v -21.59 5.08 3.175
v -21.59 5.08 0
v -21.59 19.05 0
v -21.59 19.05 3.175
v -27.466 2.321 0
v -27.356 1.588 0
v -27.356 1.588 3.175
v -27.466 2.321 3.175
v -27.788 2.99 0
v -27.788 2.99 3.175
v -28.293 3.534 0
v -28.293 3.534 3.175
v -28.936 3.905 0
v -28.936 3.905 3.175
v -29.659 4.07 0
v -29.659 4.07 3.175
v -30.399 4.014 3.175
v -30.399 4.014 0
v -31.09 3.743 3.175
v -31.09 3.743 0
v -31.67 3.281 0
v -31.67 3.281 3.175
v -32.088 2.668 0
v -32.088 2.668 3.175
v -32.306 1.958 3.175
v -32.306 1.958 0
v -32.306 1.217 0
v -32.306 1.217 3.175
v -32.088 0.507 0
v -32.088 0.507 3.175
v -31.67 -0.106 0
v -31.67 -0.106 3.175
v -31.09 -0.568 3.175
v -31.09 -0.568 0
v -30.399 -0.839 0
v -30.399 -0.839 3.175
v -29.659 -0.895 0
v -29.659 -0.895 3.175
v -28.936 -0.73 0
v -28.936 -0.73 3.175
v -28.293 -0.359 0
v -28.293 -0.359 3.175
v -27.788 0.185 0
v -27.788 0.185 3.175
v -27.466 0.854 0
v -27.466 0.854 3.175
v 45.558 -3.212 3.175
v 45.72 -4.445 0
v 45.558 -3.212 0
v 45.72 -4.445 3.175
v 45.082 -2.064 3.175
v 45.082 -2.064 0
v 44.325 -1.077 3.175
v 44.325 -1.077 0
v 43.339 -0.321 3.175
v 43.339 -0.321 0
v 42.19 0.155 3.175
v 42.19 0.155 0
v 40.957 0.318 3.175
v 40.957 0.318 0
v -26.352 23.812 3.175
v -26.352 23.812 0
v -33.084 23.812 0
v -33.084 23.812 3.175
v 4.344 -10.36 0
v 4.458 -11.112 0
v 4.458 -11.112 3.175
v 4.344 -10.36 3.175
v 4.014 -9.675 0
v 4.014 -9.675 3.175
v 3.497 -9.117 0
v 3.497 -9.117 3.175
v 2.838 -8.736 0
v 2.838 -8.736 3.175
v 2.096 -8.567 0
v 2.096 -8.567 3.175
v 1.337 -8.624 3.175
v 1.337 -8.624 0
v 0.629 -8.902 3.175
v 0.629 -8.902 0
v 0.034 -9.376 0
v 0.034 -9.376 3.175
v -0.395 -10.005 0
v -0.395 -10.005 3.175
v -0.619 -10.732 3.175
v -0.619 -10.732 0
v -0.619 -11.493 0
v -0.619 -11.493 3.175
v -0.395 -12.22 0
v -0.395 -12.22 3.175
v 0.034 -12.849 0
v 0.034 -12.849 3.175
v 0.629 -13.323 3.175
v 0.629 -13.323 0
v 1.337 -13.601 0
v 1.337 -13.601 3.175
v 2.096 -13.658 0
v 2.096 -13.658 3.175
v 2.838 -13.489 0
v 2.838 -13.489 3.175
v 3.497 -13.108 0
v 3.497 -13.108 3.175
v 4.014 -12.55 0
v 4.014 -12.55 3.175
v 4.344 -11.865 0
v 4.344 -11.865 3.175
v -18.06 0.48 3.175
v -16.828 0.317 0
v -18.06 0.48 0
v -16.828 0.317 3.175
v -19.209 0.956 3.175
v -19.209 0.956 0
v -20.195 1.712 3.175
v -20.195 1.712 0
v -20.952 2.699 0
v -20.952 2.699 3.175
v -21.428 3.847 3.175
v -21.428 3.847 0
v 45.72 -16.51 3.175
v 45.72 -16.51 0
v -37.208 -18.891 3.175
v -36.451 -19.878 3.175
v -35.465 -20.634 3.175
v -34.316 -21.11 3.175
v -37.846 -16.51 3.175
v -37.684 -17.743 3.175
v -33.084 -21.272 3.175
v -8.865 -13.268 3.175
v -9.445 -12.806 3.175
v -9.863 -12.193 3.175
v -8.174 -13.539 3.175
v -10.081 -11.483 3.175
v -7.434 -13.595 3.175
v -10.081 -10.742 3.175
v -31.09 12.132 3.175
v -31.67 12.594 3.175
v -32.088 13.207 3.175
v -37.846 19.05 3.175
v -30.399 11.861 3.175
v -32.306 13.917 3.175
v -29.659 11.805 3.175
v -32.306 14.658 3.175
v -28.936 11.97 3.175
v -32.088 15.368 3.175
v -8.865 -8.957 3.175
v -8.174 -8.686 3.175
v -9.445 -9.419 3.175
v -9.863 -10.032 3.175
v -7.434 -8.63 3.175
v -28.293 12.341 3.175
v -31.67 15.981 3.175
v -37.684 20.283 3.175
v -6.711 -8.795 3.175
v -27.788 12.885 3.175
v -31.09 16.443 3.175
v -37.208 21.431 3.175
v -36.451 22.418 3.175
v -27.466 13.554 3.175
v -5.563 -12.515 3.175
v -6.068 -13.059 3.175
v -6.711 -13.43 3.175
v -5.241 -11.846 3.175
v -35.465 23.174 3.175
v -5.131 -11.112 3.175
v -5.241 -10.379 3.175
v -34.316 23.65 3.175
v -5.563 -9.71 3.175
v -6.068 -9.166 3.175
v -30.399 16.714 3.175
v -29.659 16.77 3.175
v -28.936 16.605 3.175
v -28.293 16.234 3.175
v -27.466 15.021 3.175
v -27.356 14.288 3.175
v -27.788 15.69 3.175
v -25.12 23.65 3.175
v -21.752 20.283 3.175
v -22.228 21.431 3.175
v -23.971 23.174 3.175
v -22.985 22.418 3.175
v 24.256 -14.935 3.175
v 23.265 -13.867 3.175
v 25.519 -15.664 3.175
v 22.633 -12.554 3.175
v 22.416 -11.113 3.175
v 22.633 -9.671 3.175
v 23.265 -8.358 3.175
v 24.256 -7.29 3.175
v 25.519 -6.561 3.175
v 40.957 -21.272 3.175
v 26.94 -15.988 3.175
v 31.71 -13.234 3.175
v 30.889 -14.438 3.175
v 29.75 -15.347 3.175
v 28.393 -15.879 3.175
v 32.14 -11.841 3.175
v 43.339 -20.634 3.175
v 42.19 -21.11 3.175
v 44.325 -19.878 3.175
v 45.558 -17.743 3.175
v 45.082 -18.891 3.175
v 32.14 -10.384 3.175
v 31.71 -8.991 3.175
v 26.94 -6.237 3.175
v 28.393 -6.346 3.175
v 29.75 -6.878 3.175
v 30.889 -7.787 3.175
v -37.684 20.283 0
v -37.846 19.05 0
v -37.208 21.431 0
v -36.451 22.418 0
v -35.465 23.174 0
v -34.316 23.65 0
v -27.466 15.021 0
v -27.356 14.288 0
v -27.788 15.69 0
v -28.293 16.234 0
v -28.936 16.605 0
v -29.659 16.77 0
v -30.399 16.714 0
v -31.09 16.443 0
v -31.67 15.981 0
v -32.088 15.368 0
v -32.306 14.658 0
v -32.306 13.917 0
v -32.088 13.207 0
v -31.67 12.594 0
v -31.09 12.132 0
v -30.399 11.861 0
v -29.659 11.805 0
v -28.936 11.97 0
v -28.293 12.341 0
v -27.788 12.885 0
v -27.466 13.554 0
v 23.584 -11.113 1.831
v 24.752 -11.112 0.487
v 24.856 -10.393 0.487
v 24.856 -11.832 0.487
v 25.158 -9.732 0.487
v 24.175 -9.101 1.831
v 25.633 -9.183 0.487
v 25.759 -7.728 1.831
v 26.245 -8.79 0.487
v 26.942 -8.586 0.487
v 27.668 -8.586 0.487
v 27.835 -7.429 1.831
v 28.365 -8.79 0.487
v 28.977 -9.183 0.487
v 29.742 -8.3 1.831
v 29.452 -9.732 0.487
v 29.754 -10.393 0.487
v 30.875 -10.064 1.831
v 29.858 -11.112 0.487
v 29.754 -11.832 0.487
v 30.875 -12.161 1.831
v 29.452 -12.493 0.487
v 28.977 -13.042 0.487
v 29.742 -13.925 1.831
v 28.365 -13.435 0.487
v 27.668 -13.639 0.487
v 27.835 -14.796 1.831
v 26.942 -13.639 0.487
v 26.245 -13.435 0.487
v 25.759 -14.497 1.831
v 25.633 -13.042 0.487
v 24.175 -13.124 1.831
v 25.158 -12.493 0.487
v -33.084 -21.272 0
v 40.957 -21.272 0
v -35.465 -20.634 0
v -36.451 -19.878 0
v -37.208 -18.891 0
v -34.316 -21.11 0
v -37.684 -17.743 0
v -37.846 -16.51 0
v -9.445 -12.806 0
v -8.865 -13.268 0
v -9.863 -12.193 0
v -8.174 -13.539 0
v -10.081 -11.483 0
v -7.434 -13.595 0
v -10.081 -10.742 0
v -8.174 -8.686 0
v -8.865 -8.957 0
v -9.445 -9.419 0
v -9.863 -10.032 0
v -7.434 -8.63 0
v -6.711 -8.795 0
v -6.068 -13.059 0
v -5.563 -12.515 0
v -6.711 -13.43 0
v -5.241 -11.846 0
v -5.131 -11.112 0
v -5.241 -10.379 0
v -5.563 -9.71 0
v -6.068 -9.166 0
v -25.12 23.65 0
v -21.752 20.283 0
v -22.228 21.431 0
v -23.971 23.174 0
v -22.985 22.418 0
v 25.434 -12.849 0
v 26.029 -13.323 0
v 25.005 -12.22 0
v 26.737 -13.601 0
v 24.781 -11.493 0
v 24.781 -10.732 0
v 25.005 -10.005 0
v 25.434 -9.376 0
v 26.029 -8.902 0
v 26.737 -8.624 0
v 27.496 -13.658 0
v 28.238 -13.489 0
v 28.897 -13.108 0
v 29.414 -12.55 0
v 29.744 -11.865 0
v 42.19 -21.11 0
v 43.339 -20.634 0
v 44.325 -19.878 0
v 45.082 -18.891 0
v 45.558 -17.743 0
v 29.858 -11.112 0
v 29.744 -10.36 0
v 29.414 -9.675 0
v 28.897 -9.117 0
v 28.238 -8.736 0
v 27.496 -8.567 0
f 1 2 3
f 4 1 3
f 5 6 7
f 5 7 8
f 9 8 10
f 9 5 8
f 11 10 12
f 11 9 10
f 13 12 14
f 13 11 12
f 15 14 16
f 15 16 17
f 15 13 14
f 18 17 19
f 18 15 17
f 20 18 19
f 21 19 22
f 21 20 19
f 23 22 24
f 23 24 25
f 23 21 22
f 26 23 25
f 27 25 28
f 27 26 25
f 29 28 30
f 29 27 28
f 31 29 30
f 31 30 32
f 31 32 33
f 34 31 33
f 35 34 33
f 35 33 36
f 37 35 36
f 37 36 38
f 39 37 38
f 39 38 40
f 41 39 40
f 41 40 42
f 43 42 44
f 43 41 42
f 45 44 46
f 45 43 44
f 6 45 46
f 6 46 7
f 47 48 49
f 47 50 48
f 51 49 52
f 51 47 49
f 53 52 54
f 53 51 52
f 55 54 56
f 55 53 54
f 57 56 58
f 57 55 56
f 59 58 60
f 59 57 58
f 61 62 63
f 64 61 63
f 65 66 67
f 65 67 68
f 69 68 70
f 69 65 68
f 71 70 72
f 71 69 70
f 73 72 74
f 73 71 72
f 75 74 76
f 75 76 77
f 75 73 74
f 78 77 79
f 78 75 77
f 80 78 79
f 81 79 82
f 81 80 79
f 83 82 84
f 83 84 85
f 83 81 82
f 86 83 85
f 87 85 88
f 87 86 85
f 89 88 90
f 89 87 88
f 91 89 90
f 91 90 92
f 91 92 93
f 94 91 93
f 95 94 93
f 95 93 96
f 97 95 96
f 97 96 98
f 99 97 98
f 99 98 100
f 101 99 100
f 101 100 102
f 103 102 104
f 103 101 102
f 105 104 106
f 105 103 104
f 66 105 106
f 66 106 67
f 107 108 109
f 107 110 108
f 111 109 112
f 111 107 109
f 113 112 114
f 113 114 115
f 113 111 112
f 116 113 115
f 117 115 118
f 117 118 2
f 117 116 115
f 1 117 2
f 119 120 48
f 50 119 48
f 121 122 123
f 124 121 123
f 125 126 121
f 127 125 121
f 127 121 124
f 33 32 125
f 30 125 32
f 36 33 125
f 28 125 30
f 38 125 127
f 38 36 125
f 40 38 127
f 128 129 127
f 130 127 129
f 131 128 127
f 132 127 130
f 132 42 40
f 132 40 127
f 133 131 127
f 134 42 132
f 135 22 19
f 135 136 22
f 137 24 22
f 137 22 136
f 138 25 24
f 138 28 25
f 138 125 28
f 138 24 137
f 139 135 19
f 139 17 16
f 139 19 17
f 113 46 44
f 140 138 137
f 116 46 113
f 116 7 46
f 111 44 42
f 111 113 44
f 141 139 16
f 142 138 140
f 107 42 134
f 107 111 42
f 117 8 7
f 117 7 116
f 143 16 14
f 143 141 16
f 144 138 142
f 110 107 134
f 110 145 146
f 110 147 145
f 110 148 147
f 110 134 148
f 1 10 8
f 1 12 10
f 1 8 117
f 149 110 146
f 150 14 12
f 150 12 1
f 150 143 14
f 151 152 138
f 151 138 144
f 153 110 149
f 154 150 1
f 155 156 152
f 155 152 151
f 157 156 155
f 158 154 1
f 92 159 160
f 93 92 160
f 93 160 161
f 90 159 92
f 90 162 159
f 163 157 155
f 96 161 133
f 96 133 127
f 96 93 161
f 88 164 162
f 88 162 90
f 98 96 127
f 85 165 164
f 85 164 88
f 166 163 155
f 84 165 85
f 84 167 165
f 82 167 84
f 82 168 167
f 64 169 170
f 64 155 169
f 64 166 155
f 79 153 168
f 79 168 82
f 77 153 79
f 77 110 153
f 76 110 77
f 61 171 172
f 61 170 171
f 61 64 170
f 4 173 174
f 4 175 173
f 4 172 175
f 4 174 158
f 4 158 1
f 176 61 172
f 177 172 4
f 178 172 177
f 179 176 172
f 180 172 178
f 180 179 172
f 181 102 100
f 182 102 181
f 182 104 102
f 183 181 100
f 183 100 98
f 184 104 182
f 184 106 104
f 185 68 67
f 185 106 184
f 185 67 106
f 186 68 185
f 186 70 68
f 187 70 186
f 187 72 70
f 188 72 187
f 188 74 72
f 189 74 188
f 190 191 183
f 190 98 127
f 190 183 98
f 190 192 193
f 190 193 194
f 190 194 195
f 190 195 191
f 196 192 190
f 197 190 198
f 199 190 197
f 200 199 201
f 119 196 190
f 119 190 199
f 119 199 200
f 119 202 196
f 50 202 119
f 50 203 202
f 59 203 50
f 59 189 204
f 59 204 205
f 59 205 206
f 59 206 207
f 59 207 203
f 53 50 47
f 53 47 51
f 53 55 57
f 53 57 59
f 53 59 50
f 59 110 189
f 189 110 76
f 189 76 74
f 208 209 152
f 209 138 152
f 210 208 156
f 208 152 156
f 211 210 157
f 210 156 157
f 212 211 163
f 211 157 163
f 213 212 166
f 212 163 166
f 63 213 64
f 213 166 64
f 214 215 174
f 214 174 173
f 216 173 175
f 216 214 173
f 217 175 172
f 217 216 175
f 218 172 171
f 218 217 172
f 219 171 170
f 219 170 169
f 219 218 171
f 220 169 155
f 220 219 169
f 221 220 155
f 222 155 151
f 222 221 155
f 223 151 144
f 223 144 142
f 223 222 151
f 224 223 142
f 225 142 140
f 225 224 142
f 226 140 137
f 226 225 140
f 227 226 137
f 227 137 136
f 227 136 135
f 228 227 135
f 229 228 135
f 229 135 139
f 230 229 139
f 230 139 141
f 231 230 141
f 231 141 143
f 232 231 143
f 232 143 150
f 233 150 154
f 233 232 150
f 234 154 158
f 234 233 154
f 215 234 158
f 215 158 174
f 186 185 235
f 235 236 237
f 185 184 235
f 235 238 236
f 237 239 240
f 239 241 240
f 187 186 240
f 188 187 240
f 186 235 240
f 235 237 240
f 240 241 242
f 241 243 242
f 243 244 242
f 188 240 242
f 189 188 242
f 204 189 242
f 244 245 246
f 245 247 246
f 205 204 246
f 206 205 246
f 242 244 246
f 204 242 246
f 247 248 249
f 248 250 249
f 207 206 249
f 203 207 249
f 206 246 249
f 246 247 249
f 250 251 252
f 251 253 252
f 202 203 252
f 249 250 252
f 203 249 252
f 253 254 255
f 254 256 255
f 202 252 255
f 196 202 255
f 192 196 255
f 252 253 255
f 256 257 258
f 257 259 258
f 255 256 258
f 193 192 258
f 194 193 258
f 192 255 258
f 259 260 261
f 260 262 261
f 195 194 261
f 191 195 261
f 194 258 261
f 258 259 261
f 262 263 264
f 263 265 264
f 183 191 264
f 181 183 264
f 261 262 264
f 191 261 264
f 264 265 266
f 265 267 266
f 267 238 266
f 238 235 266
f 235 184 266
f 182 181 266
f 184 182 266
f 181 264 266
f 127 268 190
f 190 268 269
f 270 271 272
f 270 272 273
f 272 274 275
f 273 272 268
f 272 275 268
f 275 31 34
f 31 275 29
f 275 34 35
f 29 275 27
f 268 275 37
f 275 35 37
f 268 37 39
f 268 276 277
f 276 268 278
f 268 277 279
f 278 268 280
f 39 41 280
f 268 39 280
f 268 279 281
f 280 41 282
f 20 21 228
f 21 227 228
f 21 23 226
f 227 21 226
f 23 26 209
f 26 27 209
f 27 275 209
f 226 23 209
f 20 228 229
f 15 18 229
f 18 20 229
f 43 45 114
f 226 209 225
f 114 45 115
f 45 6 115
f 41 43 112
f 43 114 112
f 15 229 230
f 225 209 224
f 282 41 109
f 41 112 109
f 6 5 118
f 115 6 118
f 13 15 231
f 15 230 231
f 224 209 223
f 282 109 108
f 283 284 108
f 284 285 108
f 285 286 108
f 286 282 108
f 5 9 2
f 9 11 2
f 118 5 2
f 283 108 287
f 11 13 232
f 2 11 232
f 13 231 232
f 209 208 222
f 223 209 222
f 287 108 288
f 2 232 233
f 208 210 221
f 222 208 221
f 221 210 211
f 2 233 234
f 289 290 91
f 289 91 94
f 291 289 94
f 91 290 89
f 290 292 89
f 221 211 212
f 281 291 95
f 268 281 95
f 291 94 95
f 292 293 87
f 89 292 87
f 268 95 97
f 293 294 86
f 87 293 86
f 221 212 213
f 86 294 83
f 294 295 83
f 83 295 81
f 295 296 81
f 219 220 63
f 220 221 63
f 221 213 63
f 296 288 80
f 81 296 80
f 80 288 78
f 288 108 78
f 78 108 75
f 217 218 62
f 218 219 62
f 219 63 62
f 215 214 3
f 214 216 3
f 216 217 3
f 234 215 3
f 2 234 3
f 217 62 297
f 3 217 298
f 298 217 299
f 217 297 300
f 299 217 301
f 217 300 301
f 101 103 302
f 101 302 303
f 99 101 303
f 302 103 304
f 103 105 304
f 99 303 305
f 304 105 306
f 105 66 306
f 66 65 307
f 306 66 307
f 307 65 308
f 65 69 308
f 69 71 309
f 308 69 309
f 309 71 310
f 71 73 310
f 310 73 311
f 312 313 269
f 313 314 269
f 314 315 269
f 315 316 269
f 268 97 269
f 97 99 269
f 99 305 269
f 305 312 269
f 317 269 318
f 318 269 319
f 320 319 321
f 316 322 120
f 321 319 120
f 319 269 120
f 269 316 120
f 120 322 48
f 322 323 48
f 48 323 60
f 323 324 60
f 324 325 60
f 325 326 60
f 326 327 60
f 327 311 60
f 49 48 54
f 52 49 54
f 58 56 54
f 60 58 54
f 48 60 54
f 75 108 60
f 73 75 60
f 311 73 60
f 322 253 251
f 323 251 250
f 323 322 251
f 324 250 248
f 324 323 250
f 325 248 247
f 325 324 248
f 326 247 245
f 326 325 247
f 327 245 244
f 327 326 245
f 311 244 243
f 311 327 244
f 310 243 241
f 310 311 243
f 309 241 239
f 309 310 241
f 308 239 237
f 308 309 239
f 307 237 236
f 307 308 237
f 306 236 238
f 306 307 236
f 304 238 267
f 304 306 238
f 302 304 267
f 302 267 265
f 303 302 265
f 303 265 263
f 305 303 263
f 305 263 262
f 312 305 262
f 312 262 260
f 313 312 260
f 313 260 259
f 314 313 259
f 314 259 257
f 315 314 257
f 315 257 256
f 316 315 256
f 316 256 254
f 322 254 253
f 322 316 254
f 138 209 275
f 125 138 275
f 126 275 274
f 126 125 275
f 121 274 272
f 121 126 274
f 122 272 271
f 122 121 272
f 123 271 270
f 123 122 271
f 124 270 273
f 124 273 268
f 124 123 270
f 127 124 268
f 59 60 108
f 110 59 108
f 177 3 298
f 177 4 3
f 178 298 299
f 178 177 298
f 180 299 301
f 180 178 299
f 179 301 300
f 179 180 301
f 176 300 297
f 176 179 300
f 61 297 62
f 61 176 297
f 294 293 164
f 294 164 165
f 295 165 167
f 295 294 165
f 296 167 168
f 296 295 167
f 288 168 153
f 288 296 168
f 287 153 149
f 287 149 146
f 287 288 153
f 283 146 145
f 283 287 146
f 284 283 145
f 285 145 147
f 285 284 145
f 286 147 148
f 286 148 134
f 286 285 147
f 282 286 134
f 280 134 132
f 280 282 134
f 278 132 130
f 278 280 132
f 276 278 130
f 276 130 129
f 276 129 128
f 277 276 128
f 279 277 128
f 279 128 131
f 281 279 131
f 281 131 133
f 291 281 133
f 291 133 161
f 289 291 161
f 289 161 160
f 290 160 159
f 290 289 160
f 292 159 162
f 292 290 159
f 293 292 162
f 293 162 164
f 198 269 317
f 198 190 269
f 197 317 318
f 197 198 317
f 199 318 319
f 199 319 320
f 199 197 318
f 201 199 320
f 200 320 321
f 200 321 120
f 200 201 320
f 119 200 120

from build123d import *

# Parameters (mm, degrees)
SKETCH1_R                                       = 2.4892
SKETCH1_R_2                                     = 2.5527
BOSS_EXTRUDE1_DEPTH                             = 3.175
FILLET1_R                                       = 4.7625
CSK_FOR_10_FLAT_HEAD_MACHINE_SCREW1_D           = 5.1054
CSK_FOR_10_FLAT_HEAD_MACHINE_SCREW1_DEPTH       = 19.05
CSK_FOR_10_FLAT_HEAD_MACHINE_SCREW1_CSINK_D     = 9.779
CSK_FOR_10_FLAT_HEAD_MACHINE_SCREW1_CSINK_ANGLE = 82
CSK_FOR_10_FLAT_HEAD_MACHINE_SCREW1_TIP         = 1.533816902


with BuildPart() as part:
    # Sketch1 → Boss-Extrude1 (new body)
    with BuildSketch(Plane.XY):
        Polygon((-37.846, 23.8125), (-37.846, -21.2725), (45.72, -21.2725), (45.72, 0.3175), (-21.59, 0.3175), (-21.59, 23.8125), align=None)
        with Locations((-29.845, -11.1125)):
            Circle(SKETCH1_R, mode=Mode.SUBTRACT)
        with Locations((-7.62, -11.1125)):
            Circle(SKETCH1_R, mode=Mode.SUBTRACT)
        with Locations((1.905, -11.1125)):
            Circle(SKETCH1_R_2, mode=Mode.SUBTRACT)
        with Locations((27.305, -11.1125)):
            Circle(SKETCH1_R_2, mode=Mode.SUBTRACT)
        with Locations((-29.845, 1.5875)):
            Circle(SKETCH1_R, mode=Mode.SUBTRACT)
        with Locations((-29.845, 14.2875)):
            Circle(SKETCH1_R, mode=Mode.SUBTRACT)
        with Locations((-29.845, -11.1125)):
            Circle(SKETCH1_R)
    extrude(amount=BOSS_EXTRUDE1_DEPTH)

    # Fillet1
    fillet1_edges = [part.edges().sort_by_distance(p)[0] for p in [
        (-37.846, 23.8125, 1.5875),
        (-21.59, 23.8125, 1.5875),
        (-21.59, 0.3175, 1.5875),
        (45.72, 0.3175, 1.5875),
        (45.72, -21.2725, 1.5875),
        (-37.846, -21.2725, 1.5875),
    ]]
    fillet(fillet1_edges, radius=FILLET1_R)

    # CSK for #10 Flat Head Machine Screw1
    with Locations(Plane.XY.offset(3.175)):
        with Locations((27.305, -11.1125)):
            CounterSinkHole(CSK_FOR_10_FLAT_HEAD_MACHINE_SCREW1_D / 2, CSK_FOR_10_FLAT_HEAD_MACHINE_SCREW1_CSINK_D / 2, depth=CSK_FOR_10_FLAT_HEAD_MACHINE_SCREW1_DEPTH, counter_sink_angle=CSK_FOR_10_FLAT_HEAD_MACHINE_SCREW1_CSINK_ANGLE)
            with Locations((0, 0, -(CSK_FOR_10_FLAT_HEAD_MACHINE_SCREW1_DEPTH + CSK_FOR_10_FLAT_HEAD_MACHINE_SCREW1_TIP / 2))):  # 118° drill point
                Cone(0, CSK_FOR_10_FLAT_HEAD_MACHINE_SCREW1_D / 2, CSK_FOR_10_FLAT_HEAD_MACHINE_SCREW1_TIP, mode=Mode.SUBTRACT)


solid = part.part
